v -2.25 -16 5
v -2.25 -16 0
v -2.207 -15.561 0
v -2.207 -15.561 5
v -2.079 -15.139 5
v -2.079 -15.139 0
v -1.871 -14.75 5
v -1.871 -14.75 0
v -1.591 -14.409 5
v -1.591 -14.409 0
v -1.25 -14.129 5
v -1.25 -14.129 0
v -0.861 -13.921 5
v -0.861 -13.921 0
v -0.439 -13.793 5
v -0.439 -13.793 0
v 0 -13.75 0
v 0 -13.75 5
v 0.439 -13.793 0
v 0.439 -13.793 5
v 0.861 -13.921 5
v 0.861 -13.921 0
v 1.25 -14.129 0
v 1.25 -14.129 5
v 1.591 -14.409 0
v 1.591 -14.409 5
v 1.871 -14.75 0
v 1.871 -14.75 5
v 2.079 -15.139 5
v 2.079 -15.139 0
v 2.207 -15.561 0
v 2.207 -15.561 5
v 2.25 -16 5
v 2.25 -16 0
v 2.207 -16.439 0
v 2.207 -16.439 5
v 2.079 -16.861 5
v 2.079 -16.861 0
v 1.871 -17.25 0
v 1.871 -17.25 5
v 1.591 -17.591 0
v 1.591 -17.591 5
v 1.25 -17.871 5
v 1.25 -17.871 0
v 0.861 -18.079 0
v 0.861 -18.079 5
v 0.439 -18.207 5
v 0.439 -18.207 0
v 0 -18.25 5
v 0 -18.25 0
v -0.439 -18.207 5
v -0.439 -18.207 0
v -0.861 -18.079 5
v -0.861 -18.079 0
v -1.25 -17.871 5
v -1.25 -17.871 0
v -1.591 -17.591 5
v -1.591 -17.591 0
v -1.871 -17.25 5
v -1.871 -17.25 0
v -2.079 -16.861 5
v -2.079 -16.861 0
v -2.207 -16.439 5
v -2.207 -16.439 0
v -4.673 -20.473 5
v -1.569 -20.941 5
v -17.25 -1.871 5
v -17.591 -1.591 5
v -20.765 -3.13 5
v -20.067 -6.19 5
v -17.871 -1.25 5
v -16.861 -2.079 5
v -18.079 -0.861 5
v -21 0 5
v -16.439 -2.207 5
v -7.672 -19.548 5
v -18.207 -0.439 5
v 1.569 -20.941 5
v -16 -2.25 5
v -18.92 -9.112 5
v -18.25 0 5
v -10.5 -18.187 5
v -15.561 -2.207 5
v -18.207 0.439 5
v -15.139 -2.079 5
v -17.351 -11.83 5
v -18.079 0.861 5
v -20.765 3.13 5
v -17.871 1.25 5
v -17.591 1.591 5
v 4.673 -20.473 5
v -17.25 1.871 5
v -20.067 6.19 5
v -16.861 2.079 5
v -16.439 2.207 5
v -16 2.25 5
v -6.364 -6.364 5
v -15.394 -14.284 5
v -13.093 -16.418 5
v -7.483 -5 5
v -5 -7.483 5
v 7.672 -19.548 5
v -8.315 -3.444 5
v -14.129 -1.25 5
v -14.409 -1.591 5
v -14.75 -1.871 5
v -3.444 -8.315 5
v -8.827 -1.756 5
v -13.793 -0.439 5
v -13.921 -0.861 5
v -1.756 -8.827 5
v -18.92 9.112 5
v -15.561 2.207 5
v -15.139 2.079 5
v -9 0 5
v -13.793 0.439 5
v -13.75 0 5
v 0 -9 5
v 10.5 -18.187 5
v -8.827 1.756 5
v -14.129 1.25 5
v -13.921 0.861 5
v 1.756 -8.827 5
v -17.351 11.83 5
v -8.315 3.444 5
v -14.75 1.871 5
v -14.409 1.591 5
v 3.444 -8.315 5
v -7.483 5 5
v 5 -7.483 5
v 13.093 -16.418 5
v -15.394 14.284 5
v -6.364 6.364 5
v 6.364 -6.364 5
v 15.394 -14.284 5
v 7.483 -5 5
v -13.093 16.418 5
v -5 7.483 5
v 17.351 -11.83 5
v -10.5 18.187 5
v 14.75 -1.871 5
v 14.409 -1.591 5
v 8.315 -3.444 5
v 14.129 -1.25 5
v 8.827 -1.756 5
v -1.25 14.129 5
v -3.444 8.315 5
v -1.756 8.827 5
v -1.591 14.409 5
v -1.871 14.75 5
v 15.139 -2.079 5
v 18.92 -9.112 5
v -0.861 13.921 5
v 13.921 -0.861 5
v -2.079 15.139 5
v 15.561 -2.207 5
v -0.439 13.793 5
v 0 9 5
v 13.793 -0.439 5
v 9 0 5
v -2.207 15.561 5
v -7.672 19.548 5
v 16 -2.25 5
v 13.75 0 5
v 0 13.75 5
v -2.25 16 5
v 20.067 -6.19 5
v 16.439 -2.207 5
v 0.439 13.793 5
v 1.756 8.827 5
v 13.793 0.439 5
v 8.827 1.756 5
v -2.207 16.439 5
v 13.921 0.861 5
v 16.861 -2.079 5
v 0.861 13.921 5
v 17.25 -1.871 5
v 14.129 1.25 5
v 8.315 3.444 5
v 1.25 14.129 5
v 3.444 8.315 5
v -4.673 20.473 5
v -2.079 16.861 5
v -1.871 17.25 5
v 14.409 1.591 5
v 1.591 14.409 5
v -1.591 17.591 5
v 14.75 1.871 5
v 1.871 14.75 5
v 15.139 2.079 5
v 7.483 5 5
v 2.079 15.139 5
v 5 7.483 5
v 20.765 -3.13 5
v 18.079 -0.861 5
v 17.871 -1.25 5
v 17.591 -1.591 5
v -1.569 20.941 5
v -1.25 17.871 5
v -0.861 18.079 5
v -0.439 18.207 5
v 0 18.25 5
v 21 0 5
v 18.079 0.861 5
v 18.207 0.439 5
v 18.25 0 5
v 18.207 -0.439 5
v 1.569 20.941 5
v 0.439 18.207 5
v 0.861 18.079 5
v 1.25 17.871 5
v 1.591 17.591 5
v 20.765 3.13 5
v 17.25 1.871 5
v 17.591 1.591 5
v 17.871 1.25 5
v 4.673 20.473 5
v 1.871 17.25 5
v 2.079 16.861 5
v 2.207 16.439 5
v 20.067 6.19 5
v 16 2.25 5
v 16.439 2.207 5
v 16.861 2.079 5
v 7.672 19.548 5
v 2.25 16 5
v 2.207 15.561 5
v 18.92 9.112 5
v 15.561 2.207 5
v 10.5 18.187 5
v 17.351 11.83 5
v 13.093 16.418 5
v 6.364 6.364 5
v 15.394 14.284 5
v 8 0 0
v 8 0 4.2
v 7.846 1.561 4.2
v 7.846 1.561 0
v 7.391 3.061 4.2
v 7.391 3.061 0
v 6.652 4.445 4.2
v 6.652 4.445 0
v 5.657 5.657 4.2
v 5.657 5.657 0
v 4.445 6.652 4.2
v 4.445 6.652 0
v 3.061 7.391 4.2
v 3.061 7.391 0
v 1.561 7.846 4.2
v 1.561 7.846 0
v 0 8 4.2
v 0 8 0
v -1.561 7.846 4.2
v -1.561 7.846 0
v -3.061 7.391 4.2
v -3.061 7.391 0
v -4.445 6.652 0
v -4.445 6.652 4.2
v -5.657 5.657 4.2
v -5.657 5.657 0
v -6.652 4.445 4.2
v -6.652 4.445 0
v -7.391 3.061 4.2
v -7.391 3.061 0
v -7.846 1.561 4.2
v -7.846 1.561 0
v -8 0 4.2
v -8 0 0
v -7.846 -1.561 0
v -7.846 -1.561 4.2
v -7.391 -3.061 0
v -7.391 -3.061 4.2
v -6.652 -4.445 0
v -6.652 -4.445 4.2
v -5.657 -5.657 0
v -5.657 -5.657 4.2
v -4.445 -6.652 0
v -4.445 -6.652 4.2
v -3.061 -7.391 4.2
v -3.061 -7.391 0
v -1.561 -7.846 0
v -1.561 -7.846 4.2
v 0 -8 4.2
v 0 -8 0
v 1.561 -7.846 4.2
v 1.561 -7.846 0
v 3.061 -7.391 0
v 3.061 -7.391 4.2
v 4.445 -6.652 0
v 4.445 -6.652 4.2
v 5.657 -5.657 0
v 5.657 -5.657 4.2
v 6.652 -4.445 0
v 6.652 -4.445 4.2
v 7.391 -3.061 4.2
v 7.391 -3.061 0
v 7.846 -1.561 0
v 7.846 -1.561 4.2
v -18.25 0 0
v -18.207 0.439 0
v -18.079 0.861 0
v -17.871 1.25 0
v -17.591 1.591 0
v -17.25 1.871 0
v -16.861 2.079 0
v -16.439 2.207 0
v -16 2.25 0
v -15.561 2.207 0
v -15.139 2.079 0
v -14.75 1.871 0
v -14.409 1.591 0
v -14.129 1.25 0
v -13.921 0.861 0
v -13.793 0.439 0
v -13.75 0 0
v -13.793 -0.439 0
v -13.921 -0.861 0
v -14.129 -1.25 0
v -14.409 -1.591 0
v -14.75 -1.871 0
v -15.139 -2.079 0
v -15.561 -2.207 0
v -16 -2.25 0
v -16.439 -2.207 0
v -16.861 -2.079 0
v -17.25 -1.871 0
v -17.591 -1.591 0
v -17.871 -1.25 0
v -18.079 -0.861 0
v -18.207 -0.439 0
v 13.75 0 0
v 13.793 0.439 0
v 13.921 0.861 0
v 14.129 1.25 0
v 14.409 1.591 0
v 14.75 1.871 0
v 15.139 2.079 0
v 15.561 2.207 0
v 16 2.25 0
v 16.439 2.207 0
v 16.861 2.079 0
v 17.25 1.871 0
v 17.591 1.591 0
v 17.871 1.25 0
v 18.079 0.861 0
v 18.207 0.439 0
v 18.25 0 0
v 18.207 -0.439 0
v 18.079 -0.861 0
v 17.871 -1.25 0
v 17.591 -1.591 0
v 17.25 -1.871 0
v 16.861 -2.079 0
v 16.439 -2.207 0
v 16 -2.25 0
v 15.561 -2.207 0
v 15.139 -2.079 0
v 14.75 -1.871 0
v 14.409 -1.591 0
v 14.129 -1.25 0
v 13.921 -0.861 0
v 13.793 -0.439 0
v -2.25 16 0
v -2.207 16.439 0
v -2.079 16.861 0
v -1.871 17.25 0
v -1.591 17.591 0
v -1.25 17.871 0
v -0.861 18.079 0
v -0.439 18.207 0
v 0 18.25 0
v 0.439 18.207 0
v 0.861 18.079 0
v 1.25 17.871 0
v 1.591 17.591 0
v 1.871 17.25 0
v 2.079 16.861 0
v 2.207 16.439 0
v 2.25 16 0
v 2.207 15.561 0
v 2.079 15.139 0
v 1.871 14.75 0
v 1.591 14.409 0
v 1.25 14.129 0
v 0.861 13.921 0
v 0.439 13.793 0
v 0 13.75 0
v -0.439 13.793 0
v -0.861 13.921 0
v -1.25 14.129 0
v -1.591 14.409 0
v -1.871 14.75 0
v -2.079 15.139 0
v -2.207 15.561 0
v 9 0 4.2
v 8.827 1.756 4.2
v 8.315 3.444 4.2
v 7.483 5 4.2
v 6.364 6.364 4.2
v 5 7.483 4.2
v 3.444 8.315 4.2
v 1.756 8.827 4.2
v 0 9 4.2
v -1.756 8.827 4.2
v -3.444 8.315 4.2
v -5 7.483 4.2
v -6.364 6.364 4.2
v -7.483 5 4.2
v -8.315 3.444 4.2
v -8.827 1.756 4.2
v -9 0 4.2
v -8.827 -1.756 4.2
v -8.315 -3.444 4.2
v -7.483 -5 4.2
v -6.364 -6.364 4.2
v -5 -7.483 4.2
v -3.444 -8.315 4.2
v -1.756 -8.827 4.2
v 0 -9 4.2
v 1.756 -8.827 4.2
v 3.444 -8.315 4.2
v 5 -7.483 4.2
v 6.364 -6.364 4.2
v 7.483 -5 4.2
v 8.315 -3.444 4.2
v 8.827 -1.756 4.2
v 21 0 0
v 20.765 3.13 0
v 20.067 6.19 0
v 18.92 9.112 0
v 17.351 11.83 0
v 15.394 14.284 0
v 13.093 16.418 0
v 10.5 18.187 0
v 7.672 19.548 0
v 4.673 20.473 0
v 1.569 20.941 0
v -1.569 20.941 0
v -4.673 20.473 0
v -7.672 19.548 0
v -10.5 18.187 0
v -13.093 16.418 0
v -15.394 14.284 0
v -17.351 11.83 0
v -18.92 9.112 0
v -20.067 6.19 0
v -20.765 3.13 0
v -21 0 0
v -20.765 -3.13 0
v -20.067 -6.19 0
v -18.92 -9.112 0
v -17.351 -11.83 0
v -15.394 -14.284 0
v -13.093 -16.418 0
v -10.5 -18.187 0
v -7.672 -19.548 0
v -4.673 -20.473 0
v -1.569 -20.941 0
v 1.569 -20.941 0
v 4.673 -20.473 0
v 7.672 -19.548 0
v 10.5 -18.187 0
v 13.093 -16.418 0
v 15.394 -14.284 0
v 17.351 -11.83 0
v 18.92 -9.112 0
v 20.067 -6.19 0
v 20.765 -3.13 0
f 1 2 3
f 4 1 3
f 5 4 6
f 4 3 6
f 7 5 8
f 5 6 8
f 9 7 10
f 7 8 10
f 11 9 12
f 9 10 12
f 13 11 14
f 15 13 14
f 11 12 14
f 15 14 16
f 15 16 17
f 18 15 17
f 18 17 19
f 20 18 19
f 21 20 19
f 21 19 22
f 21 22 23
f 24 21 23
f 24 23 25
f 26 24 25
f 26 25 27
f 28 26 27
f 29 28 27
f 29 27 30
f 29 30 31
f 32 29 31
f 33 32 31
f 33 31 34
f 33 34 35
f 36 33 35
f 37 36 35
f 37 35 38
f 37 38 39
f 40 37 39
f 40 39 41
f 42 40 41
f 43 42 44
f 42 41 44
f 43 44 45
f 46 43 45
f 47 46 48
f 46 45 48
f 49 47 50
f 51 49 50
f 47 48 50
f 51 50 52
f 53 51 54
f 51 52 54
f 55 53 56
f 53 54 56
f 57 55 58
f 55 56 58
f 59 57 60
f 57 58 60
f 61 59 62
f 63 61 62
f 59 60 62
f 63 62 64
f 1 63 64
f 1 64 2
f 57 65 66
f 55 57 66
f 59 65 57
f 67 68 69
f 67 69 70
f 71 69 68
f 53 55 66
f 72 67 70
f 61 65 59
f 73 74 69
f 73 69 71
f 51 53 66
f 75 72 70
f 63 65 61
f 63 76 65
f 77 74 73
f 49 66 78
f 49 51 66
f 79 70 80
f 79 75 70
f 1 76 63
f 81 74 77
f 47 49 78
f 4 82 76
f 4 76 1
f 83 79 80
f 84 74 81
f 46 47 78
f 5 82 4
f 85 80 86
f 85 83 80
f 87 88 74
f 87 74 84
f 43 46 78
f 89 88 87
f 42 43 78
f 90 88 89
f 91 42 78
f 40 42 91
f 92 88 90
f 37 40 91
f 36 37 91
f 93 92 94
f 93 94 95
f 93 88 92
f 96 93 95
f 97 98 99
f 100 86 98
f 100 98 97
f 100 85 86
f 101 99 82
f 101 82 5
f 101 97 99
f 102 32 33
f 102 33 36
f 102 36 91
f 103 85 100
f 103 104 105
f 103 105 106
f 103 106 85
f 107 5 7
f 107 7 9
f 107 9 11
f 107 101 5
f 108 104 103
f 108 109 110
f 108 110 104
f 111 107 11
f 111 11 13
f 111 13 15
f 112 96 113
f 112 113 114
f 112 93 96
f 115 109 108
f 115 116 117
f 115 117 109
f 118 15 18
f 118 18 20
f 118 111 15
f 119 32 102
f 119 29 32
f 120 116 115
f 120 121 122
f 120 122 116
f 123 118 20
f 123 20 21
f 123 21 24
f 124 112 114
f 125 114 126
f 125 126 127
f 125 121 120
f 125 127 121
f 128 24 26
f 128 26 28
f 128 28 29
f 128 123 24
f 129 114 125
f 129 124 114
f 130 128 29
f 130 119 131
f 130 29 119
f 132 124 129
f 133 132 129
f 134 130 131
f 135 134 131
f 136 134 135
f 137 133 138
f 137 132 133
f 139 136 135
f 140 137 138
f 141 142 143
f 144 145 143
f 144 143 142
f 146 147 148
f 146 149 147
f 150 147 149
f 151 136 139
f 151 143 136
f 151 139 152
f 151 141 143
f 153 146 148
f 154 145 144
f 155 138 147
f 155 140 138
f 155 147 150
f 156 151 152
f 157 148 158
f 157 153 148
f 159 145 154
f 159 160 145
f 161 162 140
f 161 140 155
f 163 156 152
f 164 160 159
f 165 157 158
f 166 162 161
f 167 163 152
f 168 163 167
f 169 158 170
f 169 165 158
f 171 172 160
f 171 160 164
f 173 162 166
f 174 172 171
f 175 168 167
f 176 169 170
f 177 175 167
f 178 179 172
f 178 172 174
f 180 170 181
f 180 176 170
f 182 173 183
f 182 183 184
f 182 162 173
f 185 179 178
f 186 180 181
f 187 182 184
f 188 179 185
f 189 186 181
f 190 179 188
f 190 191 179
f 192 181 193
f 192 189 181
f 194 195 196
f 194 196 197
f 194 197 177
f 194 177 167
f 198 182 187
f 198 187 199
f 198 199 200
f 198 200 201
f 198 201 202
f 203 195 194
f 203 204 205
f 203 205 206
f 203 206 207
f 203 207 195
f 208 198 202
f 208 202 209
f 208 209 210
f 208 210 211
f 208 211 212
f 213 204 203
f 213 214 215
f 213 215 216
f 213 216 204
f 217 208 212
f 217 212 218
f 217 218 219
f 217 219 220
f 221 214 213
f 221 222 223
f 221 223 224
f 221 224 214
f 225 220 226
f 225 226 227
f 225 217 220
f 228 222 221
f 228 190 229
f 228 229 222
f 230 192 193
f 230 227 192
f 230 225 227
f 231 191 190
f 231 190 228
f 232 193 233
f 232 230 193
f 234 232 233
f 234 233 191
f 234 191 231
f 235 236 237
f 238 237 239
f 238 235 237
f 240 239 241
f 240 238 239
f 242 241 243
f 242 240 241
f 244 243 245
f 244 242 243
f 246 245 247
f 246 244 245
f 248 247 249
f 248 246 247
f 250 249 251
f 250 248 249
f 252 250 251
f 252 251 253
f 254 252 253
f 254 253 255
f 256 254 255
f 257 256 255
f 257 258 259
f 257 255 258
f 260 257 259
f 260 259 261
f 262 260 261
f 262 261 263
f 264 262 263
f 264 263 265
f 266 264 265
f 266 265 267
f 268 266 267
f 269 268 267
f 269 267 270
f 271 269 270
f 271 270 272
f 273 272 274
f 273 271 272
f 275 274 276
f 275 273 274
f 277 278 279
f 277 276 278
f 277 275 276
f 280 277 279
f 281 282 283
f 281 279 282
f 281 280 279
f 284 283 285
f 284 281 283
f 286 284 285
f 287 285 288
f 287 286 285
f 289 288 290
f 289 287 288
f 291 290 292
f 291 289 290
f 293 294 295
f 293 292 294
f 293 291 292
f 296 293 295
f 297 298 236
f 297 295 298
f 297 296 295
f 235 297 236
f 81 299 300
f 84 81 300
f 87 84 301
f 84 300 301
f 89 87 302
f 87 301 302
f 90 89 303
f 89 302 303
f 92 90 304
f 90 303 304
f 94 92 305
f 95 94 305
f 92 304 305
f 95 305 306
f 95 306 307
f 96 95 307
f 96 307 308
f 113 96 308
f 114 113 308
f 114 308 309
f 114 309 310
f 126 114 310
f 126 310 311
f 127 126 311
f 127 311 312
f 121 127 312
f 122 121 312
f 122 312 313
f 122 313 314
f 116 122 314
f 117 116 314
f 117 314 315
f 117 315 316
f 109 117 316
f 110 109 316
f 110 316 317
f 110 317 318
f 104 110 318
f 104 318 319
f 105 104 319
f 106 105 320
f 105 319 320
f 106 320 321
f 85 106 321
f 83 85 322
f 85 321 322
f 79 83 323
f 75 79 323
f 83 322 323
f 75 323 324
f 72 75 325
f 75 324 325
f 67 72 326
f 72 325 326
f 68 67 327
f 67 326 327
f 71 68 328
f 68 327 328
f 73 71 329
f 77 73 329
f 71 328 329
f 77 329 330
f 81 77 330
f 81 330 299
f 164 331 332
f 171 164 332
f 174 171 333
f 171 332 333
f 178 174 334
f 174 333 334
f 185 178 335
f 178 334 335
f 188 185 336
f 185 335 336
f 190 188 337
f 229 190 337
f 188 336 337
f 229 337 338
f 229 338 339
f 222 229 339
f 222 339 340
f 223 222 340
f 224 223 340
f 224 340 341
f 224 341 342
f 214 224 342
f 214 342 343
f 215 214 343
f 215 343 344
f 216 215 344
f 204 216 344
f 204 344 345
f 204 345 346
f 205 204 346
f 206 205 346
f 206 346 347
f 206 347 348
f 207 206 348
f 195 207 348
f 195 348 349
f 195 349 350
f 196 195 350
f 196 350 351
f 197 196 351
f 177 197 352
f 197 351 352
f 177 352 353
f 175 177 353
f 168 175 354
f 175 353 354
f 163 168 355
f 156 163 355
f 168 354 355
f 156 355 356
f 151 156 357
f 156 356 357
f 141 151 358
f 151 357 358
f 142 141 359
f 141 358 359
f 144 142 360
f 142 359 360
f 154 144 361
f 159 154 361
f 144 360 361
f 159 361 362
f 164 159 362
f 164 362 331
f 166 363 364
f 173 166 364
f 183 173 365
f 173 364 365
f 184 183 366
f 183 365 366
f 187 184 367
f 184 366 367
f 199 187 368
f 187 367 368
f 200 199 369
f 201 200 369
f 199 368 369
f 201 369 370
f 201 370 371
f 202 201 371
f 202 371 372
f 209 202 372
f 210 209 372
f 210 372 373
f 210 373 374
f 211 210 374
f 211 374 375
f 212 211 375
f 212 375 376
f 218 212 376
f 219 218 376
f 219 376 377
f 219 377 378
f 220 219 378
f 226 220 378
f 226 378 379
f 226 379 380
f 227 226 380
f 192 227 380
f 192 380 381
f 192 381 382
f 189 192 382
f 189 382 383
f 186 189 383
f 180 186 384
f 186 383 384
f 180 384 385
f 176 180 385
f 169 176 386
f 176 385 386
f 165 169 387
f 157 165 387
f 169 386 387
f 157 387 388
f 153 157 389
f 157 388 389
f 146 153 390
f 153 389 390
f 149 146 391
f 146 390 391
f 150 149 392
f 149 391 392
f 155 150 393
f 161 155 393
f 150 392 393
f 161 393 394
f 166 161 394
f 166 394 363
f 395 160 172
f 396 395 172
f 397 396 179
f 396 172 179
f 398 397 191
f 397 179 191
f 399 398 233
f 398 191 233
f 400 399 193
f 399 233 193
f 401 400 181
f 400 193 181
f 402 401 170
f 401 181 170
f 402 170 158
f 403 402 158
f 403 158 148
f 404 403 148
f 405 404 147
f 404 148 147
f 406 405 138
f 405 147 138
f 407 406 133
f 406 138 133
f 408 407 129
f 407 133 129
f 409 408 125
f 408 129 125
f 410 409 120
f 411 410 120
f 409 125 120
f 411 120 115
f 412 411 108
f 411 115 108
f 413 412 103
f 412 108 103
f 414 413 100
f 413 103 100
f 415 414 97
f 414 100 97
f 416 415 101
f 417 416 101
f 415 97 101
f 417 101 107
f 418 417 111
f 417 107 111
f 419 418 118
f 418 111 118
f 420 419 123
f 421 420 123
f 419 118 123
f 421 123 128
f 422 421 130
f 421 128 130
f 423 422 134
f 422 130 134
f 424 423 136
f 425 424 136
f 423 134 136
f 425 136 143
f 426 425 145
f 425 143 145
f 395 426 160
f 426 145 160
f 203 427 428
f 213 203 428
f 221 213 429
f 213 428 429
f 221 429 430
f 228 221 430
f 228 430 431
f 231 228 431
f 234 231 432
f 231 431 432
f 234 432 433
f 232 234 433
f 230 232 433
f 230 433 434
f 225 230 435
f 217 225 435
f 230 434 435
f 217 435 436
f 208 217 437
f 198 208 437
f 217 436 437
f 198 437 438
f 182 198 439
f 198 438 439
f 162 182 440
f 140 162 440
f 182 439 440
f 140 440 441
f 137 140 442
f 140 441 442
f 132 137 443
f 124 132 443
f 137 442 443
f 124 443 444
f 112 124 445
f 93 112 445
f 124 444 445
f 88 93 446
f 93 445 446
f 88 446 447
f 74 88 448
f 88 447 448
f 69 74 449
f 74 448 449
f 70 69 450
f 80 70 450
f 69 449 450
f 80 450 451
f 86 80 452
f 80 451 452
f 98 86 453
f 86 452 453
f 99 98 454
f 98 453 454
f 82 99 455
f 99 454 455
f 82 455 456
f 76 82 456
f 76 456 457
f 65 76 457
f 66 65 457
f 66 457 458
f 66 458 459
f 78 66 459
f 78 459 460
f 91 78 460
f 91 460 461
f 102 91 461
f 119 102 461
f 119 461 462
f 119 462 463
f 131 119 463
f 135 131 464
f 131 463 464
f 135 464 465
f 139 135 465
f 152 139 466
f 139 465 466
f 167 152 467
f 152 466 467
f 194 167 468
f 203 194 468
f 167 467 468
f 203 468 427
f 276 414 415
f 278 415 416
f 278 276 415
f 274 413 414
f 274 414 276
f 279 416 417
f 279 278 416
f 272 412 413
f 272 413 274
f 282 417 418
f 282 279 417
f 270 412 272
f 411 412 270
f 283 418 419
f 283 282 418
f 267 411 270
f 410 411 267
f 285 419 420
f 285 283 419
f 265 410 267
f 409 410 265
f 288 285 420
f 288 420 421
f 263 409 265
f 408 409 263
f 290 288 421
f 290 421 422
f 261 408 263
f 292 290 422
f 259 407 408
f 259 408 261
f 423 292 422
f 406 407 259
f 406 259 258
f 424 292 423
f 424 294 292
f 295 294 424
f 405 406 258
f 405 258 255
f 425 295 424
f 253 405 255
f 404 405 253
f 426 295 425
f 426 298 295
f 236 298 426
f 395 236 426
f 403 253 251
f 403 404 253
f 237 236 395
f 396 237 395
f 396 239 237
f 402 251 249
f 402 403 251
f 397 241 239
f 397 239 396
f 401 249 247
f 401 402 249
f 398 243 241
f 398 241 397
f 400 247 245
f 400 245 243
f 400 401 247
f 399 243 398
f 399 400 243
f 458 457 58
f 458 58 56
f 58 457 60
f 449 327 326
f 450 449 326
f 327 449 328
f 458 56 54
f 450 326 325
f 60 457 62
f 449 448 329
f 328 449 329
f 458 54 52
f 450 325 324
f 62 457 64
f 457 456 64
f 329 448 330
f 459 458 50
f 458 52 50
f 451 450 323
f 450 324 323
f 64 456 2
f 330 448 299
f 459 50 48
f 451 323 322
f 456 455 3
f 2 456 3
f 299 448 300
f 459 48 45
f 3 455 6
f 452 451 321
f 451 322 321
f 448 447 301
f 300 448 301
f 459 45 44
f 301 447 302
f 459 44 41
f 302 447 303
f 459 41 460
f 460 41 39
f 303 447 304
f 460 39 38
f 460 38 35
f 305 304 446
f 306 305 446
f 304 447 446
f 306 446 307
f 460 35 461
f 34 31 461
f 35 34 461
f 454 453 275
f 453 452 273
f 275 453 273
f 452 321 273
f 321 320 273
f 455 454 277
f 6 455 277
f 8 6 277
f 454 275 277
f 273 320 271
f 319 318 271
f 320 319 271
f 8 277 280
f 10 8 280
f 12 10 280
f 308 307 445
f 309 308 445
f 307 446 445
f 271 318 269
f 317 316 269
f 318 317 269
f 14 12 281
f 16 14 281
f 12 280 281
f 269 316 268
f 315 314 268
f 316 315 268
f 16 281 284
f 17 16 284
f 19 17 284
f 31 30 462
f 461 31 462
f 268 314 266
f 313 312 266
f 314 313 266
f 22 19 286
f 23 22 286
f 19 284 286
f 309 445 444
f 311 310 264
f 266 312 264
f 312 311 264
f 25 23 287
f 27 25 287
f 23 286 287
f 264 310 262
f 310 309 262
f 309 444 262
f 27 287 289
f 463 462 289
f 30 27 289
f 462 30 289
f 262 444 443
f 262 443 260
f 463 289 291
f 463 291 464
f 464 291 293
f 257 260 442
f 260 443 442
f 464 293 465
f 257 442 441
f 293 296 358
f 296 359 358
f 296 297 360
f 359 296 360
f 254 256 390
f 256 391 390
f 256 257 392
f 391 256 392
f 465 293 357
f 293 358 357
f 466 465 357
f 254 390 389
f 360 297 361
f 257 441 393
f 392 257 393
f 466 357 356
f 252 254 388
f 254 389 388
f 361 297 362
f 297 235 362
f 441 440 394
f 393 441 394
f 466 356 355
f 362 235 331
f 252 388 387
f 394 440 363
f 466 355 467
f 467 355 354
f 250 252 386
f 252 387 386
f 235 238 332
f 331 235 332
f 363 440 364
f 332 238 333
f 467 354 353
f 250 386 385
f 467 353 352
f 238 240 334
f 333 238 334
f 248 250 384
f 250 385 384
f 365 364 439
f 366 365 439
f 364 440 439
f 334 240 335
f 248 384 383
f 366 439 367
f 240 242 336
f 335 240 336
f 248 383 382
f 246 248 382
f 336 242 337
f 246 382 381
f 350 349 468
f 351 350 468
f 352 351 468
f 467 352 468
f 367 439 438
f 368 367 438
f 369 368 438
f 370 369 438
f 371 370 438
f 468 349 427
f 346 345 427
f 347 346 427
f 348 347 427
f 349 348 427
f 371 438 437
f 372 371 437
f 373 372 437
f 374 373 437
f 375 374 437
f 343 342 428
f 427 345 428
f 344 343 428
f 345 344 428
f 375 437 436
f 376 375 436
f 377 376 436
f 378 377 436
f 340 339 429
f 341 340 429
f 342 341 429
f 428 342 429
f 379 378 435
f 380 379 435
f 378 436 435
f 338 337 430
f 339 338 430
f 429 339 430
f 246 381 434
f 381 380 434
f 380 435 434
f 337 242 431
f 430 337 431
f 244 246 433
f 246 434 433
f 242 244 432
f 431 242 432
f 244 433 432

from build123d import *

# Parameters (mm, degrees)
SKETCH_1_R          = 21
SKETCH_1_R_2        = 8
EXTRUDE_1_DEPTH     = 5
HOLE_WIZARD_M41_D   = 4.5
SKETCH_4_R          = 9
CUT_EXTRUDE_1_DEPTH = 0.8


with BuildPart() as part:
    # Эскиз1 → Бобышка-Вытянуть1 (new body)
    with BuildSketch(Plane.XY):
        Circle(SKETCH_1_R)
        Circle(SKETCH_1_R_2, mode=Mode.SUBTRACT)
    extrude(amount=EXTRUDE_1_DEPTH)

    # Отверстие с зазором M41 (through all)
    with Locations(Plane.XY.offset(5)):
        with Locations((0, 16), (-16, 0), (0, -16), (16, 0)):
            Hole(HOLE_WIZARD_M41_D / 2)

    # Эскиз4 → Вырез-Вытянуть1 (cut)
    with BuildSketch(Plane.XY.offset(5)):
        Circle(SKETCH_4_R)
    extrude(amount=-CUT_EXTRUDE_1_DEPTH, mode=Mode.SUBTRACT)


solid = part.part
